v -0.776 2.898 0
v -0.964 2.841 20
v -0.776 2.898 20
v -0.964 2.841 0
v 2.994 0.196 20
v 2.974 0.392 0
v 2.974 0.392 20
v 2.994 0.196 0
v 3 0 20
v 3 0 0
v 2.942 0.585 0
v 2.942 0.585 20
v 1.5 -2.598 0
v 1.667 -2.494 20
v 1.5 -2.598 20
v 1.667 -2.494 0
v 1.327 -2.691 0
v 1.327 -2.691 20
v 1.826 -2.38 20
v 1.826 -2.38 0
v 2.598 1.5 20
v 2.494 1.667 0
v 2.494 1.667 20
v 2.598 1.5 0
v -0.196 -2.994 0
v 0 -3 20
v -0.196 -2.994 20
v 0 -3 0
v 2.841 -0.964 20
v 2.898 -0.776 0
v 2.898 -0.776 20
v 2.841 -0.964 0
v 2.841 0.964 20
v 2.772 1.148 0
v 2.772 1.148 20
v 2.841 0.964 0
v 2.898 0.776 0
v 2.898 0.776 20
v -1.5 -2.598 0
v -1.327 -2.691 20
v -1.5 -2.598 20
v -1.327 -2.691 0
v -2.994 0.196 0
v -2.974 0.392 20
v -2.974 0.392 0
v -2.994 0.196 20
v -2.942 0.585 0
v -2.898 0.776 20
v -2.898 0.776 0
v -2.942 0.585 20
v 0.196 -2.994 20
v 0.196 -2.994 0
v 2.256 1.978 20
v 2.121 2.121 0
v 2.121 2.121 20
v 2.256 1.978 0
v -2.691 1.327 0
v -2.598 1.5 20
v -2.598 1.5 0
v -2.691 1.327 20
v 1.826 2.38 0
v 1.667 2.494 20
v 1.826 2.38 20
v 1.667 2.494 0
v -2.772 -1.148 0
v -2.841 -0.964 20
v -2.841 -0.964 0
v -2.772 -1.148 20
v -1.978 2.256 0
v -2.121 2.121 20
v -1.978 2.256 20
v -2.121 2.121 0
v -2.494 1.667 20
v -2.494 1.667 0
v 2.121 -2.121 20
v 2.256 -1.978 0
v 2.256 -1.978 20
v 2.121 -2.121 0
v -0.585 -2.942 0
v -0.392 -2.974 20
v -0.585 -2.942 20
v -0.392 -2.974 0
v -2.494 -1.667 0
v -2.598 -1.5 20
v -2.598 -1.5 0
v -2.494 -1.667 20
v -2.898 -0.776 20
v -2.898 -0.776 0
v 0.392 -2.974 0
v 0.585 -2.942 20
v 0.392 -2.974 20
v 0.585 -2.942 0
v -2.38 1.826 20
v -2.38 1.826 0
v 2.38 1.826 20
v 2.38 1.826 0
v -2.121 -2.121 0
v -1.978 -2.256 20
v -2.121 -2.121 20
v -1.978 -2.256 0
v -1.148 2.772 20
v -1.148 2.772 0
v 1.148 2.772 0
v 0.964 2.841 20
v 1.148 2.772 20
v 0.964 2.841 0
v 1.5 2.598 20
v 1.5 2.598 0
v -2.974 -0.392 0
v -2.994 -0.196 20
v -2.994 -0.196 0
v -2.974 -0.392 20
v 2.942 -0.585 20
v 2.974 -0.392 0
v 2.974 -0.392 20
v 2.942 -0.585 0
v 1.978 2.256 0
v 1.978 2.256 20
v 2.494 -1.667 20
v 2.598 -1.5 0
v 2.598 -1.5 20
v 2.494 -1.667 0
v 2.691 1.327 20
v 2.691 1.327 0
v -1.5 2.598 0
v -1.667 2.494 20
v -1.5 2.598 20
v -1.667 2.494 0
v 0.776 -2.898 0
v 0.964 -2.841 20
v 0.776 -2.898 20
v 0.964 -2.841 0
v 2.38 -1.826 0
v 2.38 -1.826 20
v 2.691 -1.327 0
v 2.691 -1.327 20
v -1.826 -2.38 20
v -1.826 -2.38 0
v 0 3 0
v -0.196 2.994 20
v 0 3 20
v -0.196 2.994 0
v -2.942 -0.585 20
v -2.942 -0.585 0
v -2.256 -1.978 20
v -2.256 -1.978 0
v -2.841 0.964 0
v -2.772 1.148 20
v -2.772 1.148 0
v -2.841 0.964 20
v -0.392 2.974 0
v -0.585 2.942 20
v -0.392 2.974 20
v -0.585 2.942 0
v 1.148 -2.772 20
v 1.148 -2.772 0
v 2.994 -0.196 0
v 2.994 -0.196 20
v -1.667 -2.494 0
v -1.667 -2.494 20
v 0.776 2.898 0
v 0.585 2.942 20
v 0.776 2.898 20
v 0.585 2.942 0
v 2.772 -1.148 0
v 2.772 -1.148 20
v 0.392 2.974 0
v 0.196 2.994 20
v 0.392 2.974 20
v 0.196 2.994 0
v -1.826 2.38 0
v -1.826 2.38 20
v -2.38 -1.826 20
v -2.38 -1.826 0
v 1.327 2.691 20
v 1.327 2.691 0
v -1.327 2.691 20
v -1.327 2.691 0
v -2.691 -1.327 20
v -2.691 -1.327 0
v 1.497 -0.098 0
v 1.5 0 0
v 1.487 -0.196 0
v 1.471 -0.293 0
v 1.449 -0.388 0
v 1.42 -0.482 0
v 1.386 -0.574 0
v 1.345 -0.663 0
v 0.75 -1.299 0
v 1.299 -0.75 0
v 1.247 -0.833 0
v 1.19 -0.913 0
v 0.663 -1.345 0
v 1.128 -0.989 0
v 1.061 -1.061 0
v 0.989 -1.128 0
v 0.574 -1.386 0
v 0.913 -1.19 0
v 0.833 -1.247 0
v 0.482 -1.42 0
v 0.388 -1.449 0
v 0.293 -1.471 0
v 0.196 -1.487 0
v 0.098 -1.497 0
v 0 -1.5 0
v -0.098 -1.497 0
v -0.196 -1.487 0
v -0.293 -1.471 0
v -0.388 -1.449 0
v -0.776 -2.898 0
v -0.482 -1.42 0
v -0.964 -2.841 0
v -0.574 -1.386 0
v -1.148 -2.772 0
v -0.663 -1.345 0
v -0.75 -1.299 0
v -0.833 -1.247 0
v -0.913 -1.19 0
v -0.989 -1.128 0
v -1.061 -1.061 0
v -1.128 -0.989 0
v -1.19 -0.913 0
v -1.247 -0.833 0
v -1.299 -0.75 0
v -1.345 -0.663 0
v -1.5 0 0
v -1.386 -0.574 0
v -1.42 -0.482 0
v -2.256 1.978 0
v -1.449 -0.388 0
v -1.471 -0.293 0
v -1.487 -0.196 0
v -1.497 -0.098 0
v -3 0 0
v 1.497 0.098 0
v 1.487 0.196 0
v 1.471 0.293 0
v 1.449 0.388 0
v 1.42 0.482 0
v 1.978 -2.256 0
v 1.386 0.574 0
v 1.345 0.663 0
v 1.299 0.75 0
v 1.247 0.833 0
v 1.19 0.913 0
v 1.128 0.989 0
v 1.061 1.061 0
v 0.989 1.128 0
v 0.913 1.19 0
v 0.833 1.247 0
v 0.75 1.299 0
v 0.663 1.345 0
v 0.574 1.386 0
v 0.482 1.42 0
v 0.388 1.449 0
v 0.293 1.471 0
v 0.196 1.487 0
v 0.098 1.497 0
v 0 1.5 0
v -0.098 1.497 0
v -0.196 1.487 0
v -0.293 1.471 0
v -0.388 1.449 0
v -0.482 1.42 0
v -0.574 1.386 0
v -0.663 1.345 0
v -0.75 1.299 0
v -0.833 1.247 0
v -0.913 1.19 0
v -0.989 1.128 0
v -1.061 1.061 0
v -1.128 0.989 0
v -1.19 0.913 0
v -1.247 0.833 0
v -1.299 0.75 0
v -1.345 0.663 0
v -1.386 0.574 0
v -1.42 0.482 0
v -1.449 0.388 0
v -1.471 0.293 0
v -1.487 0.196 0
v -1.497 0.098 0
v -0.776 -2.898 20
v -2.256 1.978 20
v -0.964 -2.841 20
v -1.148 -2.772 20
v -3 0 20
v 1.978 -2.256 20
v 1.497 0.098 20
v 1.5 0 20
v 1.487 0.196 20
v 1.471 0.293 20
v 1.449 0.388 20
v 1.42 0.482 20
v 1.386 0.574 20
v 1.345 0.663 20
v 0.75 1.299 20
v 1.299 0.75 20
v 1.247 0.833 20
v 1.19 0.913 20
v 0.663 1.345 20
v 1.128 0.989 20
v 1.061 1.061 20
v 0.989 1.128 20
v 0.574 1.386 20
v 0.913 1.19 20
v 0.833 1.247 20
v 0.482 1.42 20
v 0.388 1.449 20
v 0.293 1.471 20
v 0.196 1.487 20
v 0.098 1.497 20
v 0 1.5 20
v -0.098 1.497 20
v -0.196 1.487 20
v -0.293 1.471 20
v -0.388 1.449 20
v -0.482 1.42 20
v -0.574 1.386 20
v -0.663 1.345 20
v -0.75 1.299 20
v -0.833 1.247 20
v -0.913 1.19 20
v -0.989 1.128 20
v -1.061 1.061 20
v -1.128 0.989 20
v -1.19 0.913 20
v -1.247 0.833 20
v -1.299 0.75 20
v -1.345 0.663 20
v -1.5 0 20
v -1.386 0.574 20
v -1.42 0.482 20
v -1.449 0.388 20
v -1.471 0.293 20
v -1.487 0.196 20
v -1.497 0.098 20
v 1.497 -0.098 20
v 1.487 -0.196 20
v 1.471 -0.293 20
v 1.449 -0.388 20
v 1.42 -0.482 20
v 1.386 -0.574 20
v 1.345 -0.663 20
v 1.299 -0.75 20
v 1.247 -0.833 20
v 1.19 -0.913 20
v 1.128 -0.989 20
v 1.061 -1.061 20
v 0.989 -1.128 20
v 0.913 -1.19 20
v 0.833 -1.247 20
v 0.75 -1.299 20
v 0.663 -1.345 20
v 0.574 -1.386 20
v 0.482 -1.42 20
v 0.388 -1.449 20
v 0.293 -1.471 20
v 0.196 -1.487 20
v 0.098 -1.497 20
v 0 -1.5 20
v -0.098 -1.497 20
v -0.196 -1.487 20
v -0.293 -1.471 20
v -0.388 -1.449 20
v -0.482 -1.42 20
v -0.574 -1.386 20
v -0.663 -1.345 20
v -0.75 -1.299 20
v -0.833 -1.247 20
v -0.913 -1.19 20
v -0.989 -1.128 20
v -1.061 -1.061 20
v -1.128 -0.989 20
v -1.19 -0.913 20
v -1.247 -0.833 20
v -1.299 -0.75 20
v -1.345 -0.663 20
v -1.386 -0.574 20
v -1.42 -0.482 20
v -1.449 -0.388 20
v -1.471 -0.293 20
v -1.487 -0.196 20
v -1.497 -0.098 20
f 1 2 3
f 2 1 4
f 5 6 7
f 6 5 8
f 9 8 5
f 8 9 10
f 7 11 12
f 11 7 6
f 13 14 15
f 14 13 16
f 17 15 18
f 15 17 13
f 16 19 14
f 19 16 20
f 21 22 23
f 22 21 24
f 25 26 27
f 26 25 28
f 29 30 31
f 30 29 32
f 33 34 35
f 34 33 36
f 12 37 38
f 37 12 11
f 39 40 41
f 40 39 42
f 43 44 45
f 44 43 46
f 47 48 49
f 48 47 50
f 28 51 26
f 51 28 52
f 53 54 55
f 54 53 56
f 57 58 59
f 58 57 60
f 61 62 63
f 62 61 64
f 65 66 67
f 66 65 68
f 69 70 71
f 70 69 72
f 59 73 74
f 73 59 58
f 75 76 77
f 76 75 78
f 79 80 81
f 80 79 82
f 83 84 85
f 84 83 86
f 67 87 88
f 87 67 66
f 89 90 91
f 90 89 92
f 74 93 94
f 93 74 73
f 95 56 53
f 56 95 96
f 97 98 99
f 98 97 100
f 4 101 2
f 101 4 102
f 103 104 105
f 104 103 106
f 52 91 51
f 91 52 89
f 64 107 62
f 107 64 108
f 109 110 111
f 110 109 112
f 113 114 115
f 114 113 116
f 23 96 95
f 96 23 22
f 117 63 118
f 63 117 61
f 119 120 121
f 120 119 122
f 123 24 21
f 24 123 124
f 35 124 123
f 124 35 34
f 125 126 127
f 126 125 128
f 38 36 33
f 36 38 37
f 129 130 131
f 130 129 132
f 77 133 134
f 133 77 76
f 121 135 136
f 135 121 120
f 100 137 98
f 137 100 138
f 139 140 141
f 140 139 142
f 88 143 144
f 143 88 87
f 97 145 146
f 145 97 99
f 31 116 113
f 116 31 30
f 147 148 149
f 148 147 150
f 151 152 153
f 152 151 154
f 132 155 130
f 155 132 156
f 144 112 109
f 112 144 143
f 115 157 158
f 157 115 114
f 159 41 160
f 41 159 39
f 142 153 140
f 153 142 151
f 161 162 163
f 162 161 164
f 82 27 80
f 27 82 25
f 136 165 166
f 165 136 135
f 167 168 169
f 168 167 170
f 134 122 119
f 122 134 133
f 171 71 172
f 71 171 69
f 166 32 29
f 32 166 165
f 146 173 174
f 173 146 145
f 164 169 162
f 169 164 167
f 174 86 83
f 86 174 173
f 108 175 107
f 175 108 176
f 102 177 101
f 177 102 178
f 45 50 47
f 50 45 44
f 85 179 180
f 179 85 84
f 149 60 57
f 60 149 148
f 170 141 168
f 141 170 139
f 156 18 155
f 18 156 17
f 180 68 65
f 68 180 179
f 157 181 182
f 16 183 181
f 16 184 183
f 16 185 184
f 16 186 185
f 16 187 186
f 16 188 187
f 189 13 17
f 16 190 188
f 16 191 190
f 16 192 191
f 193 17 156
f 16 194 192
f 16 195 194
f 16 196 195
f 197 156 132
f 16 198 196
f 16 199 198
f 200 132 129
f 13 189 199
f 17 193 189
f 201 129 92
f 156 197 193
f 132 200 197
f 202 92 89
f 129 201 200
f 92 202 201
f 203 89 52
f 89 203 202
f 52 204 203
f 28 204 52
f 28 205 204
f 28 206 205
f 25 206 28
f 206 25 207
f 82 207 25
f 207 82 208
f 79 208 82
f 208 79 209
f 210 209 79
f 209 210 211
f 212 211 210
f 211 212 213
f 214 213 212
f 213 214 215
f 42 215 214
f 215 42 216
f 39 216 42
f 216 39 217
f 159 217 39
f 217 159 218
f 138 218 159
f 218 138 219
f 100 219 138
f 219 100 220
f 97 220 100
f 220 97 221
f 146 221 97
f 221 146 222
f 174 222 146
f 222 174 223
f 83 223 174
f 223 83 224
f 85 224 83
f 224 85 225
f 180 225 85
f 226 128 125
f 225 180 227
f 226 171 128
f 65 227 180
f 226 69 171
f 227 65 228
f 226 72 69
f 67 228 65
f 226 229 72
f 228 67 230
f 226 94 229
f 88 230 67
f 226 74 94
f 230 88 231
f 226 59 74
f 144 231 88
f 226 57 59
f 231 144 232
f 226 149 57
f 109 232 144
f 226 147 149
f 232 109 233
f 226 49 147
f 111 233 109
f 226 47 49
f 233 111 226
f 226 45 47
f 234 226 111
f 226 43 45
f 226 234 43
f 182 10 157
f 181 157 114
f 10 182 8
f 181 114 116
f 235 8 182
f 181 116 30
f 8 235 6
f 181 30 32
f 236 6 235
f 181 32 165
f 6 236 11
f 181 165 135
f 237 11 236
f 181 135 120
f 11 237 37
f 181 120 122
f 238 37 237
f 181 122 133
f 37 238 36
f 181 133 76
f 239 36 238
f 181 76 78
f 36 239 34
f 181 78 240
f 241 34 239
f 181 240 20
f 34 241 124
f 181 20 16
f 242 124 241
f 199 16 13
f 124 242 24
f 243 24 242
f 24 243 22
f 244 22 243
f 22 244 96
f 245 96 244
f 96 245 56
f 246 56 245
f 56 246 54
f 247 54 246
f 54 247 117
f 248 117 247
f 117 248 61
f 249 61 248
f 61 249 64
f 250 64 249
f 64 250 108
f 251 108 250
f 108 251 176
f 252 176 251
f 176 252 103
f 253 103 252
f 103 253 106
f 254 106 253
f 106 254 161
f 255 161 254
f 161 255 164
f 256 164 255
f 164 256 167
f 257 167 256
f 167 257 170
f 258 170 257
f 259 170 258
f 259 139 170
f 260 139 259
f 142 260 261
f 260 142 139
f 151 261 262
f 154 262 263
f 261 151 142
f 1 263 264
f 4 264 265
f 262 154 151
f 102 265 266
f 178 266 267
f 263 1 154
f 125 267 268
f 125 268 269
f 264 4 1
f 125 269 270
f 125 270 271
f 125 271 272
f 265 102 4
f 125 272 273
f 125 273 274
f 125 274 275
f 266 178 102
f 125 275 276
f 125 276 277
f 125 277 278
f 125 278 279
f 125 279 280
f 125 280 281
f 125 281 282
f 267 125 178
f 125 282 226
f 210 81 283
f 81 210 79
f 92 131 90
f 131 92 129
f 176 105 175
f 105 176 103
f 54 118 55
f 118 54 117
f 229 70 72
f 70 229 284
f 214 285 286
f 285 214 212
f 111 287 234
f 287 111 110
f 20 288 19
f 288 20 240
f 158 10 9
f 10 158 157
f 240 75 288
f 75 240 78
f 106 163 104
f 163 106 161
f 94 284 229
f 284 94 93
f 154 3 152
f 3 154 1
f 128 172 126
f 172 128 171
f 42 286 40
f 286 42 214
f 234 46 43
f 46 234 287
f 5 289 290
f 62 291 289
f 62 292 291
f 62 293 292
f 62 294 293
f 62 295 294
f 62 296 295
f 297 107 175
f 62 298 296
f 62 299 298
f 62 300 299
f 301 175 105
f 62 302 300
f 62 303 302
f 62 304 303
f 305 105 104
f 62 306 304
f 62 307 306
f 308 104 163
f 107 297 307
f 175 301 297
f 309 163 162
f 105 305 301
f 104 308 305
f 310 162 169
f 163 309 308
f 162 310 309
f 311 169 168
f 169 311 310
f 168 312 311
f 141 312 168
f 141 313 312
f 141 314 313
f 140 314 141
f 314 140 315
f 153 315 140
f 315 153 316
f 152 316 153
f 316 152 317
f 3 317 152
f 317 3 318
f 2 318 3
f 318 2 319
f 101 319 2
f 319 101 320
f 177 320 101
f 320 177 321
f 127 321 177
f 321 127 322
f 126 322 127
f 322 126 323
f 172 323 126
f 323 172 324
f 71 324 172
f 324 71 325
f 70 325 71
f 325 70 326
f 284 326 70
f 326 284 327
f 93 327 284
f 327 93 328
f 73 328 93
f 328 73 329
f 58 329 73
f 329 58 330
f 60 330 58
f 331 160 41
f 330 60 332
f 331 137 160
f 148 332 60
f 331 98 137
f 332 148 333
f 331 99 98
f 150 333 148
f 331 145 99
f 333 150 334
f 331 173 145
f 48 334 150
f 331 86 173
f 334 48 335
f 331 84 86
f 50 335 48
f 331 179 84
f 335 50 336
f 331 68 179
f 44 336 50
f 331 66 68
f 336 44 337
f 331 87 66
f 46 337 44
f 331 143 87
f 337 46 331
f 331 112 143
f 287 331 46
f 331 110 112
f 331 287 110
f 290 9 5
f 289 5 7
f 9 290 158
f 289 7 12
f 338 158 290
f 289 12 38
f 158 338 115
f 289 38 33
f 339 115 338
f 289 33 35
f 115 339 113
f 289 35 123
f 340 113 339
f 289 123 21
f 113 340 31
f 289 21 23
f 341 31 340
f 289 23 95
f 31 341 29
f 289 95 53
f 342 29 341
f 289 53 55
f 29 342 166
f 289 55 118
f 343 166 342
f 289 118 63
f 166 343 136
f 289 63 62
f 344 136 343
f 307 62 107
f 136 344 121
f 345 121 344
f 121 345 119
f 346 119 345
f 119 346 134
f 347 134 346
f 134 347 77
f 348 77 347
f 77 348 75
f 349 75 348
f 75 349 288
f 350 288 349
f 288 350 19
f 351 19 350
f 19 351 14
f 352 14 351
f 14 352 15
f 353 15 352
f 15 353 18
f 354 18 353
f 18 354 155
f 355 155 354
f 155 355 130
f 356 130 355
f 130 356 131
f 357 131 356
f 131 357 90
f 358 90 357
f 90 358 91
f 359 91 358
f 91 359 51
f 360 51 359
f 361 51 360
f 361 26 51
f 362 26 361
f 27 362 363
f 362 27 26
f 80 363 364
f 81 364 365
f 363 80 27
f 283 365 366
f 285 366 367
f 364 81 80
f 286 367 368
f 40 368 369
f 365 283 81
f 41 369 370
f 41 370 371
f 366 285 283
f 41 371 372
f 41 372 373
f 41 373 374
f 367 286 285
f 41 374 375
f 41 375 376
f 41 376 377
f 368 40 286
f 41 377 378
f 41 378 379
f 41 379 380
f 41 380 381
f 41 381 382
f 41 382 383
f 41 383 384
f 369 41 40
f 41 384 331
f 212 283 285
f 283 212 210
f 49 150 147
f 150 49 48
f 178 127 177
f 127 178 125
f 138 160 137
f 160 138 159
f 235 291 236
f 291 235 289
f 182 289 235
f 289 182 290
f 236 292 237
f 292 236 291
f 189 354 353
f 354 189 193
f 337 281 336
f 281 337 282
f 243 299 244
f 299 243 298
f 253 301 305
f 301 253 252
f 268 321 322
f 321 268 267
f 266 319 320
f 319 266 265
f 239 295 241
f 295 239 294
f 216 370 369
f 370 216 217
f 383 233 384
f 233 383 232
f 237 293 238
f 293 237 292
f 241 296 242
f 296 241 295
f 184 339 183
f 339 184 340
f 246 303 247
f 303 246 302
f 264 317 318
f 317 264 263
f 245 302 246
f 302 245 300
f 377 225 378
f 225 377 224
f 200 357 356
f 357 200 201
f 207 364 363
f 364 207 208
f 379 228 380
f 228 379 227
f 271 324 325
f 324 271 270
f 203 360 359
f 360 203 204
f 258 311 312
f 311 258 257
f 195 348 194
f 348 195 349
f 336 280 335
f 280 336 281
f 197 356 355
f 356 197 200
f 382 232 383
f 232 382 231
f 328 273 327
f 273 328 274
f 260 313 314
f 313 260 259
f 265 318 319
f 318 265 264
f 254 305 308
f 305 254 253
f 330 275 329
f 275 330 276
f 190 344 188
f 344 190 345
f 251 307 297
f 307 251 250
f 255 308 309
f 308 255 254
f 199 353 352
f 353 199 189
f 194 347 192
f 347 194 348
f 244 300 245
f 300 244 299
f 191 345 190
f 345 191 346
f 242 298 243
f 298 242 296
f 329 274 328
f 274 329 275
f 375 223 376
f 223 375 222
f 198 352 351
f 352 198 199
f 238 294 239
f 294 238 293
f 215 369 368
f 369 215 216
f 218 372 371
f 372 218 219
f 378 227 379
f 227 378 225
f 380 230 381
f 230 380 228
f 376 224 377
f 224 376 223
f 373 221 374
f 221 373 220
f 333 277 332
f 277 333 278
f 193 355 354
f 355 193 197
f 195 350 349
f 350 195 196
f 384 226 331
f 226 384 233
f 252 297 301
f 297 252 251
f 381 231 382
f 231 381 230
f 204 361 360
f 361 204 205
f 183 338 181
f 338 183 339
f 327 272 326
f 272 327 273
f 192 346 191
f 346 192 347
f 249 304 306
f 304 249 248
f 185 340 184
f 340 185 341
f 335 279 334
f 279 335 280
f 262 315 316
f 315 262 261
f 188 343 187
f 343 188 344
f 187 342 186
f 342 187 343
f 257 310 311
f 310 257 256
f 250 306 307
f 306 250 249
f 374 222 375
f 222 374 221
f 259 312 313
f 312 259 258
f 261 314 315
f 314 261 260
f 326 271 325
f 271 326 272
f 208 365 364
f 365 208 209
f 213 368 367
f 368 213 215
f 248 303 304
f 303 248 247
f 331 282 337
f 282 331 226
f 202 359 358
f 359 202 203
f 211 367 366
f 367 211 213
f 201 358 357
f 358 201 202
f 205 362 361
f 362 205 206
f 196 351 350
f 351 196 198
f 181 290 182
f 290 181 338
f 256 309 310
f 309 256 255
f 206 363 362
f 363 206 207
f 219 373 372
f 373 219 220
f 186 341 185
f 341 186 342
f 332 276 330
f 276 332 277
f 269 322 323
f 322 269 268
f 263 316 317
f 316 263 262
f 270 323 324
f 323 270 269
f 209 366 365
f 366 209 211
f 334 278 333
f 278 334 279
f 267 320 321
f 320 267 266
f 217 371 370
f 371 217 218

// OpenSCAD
// Standoff pillar: M3 thread, 20mm long, diameter unspecified -> use common standoff OD (6mm)
// One connected solid: cylindrical standoff body with internal M3 clearance hole (no floating parts).

$fn = 96;

// Parameters
length_mm        = 20.0;   // overall length
standoff_od_mm   = 6.0;    // typical M3 standoff outer diameter when unspecified
hole_d_mm        = 3.0;    // 3.0mm thread spec -> represent as through hole for M3 screw
chamfer_mm       = 0.6;    // small edge break for printability/fit

module standoff_pillar(L=20, od=6, hole_d=3, chamfer=0.6) {
    r_out = od/2;
    r_hole = hole_d/2;
    c = min(chamfer, r_out - 0.2);

    difference() {
        // Outer body with simple chamfers (still one connected solid after subtraction)
        union() {
            cylinder(h=L, r=r_out, center=false);

            // Top chamfer (overlaps into body)
            translate([0,0,L - c])
                cylinder(h=c, r1=r_out, r2=max(0.01, r_out - c), center=false);

            // Bottom chamfer (overlaps into body)
            cylinder(h=c, r1=max(0.01, r_out - c), r2=r_out, center=false);
        }

        // Through hole (slightly extended to guarantee clean cut)
        eps = 0.05;
        translate([0,0,-eps])
            cylinder(h=L + 2*eps, r=r_hole, center=false);
    }
}

standoff_pillar(
    L=length_mm,
    od=standoff_od_mm,
    hole_d=hole_d_mm,
    chamfer=chamfer_mm
);
